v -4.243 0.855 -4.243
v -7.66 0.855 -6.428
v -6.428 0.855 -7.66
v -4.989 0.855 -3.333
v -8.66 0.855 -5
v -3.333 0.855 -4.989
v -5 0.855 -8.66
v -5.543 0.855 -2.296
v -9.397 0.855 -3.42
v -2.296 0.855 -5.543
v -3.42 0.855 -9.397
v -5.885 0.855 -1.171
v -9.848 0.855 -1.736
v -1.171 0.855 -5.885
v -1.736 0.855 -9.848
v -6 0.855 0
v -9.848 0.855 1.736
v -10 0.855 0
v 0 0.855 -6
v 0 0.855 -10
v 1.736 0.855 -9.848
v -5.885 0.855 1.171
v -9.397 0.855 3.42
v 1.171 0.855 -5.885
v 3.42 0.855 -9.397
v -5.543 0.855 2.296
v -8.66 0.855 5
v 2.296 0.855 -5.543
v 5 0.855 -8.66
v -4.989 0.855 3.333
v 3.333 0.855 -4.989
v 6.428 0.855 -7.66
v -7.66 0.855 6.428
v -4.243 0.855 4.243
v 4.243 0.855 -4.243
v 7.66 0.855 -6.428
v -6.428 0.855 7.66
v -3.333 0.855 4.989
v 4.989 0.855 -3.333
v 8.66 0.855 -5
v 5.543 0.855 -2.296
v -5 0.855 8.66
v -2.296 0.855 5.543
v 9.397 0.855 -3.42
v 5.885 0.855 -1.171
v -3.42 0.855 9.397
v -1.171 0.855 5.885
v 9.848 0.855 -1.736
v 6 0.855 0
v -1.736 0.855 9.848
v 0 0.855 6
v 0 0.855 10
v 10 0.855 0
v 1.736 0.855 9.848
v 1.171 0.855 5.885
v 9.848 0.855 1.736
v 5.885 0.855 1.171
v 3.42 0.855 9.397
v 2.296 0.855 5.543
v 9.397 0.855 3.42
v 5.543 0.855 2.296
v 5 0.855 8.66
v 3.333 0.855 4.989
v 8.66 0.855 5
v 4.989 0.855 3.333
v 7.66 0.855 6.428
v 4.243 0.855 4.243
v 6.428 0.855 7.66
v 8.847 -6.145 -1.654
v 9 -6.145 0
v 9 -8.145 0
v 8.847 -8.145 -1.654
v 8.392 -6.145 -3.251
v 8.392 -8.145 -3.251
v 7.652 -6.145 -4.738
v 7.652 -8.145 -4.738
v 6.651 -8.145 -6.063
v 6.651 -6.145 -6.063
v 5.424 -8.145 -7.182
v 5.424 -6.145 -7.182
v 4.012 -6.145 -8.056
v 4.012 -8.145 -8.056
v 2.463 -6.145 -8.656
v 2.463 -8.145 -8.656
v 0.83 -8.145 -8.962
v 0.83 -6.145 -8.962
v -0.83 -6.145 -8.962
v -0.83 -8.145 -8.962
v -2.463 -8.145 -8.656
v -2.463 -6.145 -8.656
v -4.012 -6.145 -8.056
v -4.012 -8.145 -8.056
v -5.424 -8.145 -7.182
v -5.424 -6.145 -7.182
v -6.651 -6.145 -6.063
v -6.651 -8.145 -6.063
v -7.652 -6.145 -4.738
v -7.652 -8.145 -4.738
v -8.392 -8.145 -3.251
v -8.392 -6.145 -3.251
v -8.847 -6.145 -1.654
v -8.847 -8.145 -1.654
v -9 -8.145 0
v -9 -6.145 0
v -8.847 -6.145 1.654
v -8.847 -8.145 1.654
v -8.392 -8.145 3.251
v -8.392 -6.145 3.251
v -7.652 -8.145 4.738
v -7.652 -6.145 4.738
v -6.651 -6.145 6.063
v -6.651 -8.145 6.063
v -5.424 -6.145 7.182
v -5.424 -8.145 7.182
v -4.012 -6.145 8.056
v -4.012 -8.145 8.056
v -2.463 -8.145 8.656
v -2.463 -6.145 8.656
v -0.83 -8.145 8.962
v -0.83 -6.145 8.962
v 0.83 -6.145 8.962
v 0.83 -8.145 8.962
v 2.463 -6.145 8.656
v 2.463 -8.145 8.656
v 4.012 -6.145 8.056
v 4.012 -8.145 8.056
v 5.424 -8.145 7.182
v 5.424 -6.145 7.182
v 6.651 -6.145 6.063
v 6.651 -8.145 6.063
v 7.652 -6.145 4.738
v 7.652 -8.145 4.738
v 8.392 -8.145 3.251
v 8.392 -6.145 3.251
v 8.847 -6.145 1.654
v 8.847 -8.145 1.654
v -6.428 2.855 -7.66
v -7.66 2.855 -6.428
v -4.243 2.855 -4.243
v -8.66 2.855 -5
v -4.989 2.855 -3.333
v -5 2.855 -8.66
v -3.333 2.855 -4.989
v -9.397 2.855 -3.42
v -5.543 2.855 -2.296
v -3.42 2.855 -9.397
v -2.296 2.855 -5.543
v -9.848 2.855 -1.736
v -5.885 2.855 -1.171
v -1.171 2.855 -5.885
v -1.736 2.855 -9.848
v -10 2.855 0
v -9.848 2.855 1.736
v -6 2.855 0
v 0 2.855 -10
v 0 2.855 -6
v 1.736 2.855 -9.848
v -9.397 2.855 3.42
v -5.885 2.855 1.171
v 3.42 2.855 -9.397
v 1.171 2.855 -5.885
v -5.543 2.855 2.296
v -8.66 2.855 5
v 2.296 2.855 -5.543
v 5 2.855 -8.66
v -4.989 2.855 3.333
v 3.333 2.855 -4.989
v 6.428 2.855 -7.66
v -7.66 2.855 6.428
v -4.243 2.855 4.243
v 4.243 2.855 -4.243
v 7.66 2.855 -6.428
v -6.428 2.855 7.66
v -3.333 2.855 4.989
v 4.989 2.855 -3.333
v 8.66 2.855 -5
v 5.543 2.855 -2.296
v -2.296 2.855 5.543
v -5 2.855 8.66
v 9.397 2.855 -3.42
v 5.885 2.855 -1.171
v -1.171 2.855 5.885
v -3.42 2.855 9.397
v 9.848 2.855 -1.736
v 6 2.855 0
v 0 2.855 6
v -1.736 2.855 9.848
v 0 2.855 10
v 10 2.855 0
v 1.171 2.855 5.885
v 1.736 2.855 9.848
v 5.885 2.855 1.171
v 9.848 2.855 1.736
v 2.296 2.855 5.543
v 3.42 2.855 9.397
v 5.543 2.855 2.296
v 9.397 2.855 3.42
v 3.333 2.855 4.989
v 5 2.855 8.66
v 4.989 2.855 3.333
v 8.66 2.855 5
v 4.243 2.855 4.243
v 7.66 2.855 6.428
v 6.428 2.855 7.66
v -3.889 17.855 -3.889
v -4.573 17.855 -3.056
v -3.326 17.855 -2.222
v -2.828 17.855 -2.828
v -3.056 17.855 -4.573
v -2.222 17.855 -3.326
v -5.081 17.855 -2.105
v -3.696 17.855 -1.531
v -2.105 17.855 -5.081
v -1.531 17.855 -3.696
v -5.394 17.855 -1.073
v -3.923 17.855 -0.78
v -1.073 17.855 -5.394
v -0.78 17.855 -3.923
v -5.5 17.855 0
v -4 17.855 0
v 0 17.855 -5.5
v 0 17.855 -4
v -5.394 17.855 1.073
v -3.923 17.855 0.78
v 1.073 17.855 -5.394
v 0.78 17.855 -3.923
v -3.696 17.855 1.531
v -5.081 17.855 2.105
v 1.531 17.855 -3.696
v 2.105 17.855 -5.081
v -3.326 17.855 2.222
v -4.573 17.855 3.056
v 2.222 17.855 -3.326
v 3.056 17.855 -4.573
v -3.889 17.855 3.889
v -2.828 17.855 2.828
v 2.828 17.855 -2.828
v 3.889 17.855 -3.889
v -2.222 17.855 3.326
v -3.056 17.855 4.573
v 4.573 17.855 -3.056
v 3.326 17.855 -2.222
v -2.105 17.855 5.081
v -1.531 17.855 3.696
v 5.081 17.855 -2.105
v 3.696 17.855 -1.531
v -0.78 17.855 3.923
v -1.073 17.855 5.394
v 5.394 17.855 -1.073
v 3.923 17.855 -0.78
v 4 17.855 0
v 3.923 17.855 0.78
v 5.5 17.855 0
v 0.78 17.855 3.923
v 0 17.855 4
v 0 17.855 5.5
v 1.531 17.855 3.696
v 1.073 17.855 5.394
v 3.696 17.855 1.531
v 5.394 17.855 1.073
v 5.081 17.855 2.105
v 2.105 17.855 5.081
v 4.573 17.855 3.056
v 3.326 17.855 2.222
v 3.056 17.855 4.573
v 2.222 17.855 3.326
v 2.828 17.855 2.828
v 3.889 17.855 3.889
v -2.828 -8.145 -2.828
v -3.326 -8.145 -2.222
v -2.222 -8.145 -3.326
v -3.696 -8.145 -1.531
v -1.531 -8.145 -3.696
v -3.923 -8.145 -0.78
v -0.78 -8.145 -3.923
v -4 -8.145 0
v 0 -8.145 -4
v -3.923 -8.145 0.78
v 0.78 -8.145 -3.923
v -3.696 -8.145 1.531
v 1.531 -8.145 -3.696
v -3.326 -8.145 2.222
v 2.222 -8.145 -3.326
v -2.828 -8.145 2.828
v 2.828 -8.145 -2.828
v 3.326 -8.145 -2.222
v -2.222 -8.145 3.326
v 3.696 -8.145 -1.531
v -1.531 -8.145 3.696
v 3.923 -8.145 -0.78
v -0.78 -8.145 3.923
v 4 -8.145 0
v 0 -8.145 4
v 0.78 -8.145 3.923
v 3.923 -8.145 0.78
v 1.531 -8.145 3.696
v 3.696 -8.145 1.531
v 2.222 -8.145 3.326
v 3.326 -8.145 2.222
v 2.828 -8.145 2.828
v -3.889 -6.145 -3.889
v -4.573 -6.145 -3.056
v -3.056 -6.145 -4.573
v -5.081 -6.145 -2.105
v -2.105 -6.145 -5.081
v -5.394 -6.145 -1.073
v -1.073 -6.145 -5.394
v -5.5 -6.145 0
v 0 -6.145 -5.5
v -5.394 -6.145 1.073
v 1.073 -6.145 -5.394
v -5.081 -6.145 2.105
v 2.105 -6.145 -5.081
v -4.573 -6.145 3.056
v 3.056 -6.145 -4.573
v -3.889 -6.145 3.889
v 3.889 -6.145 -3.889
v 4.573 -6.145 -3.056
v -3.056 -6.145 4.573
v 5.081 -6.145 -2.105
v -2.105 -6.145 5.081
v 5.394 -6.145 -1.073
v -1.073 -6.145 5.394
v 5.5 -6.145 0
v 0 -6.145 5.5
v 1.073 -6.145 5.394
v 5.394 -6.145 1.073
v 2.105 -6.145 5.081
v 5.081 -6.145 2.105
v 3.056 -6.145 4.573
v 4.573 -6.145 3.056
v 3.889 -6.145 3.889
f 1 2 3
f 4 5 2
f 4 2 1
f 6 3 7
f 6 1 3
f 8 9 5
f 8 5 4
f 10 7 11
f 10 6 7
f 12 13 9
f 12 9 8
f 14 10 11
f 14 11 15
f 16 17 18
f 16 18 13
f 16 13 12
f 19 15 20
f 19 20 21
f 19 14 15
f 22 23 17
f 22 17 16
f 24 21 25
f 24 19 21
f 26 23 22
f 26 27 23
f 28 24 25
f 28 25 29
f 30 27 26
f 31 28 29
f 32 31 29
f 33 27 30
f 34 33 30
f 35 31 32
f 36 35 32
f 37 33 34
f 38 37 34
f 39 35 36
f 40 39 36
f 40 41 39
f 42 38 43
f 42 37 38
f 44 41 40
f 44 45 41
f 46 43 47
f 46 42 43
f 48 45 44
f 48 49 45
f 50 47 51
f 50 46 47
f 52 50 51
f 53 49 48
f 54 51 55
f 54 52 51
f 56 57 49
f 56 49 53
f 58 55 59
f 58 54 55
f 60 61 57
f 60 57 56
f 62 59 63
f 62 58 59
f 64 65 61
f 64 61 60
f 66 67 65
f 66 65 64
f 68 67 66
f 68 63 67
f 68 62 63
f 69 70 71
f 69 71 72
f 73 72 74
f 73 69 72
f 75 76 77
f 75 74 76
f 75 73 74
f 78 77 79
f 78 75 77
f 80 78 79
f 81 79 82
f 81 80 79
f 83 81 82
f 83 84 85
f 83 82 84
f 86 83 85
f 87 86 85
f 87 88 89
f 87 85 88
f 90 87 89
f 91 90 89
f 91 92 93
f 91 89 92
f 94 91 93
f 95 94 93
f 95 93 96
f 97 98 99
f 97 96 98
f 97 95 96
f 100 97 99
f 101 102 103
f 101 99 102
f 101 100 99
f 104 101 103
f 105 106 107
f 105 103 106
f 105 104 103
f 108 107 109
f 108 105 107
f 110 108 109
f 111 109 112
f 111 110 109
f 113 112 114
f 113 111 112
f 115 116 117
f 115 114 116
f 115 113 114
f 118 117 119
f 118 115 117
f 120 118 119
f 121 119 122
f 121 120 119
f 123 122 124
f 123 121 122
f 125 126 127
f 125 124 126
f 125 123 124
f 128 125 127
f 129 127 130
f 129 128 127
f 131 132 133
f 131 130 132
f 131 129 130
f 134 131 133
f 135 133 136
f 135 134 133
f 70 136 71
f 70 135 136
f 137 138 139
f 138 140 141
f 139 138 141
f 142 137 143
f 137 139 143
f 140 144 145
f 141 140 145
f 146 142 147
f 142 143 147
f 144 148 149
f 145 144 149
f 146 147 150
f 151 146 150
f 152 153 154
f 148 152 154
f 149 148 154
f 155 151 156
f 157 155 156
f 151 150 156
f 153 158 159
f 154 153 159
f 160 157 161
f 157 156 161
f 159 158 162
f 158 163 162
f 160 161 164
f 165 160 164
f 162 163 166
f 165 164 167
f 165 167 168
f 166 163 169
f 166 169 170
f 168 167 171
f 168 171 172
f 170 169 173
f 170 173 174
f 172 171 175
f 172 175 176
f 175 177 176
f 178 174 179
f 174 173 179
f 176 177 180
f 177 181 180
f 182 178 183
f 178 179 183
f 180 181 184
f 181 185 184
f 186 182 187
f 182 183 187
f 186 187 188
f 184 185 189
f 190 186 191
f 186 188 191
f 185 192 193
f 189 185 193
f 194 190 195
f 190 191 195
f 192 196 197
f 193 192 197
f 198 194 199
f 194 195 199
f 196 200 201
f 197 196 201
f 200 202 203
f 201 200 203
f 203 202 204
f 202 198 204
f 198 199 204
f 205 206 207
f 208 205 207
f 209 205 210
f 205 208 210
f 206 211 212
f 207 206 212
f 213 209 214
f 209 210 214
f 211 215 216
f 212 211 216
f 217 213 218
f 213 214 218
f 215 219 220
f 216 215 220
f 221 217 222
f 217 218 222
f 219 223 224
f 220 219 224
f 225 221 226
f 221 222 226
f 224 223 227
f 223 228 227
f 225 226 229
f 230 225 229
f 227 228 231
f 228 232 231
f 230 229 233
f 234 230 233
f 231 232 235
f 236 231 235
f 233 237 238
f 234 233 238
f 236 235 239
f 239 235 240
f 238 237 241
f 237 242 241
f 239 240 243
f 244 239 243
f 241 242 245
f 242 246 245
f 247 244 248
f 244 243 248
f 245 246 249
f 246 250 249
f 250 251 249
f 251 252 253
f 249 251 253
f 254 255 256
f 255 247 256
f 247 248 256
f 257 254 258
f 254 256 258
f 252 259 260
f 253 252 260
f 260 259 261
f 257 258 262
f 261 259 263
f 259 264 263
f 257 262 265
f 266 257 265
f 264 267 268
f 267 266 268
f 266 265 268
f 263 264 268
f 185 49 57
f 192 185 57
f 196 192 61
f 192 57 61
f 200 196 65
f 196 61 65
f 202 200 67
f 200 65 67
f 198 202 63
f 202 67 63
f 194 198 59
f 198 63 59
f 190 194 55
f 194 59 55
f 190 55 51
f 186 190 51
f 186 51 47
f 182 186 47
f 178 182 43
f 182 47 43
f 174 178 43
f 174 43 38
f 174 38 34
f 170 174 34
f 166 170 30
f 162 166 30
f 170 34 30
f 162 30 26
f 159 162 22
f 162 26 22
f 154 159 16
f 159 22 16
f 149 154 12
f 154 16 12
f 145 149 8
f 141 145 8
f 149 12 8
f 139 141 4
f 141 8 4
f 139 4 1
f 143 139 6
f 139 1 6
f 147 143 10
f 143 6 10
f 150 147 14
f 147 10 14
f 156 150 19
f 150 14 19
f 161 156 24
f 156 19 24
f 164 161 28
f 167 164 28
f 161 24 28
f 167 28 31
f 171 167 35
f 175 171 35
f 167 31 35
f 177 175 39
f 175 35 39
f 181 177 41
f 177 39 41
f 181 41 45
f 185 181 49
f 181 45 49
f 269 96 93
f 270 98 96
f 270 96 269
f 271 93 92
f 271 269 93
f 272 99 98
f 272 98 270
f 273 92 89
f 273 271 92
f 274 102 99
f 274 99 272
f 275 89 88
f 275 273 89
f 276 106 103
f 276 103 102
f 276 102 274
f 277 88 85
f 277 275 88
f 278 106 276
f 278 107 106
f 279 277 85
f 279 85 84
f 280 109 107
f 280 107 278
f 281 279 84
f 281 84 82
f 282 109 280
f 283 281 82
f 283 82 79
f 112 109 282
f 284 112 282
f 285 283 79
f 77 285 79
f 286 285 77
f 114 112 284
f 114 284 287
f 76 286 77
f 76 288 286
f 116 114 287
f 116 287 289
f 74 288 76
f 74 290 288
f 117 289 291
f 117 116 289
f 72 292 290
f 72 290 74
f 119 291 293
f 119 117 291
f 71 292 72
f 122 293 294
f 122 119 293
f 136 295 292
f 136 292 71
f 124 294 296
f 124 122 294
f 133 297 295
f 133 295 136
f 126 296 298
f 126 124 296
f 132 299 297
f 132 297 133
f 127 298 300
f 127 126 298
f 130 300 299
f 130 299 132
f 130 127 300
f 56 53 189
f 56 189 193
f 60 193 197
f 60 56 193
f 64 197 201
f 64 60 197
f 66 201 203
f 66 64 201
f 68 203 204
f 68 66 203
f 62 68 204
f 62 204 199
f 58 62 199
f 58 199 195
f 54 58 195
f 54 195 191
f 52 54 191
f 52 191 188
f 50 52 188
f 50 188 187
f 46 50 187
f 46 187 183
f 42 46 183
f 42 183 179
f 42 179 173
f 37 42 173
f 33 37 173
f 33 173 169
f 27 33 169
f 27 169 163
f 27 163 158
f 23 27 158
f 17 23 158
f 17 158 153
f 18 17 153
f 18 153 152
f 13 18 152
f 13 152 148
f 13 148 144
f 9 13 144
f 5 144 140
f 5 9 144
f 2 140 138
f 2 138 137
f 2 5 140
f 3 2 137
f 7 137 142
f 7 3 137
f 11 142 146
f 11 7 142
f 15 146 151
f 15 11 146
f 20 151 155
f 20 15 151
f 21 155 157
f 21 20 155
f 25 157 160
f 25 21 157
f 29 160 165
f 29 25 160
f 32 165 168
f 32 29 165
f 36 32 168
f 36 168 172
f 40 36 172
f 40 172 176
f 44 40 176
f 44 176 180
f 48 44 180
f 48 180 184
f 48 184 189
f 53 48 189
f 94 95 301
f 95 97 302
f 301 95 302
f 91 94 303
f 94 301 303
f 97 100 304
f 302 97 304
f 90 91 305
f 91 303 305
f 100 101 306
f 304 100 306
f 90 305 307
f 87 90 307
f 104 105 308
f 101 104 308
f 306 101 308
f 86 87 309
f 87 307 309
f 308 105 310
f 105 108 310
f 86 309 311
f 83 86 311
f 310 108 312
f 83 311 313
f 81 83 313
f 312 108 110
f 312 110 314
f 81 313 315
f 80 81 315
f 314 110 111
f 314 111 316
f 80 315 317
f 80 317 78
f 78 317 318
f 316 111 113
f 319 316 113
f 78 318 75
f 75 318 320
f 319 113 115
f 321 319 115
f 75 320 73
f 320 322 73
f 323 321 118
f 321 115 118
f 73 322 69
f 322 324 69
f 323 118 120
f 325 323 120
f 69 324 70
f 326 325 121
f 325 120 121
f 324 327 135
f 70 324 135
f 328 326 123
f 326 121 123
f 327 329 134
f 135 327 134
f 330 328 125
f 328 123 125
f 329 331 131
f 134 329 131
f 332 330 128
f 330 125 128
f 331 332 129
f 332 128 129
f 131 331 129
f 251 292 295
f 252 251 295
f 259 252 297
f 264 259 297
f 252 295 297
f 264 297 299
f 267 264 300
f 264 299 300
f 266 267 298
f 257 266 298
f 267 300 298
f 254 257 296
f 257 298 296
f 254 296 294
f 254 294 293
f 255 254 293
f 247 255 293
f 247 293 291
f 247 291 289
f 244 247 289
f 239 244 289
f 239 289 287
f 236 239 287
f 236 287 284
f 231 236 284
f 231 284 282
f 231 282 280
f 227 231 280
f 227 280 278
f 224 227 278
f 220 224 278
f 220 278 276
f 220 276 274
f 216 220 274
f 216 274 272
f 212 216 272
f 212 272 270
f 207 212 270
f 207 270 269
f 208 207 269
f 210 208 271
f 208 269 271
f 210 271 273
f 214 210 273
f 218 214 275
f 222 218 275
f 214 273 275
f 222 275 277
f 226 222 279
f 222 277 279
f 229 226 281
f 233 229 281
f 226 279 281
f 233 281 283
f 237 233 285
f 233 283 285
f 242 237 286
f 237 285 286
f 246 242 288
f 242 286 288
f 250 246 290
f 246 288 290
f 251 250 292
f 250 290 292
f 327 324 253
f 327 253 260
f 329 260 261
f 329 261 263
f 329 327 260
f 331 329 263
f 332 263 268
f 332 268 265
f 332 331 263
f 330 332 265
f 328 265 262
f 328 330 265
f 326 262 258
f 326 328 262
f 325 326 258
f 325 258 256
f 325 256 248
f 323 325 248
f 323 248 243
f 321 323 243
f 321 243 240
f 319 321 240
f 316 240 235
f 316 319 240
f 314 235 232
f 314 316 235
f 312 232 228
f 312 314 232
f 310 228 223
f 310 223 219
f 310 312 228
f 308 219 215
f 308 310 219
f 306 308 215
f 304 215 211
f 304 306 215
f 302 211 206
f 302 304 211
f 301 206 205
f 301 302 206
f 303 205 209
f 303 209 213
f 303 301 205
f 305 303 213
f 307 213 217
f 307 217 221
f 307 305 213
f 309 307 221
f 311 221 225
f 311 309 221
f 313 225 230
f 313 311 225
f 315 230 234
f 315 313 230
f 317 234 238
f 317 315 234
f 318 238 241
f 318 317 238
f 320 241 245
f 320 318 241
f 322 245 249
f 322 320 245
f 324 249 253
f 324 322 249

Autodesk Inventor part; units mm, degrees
ref_plane "YZ Plane" through (0, 0, 0) normal (1, 0, 0) x (0, 1, 0)
ref_plane "XZ Plane" through (0, 0, 0) normal (0, 1, 0) x (-1, 0, 0)
ref_plane "XY Plane" through (0, 0, 0) normal (0, 0, 1) x (1, 0, 0)
sketch "Skizze1" plane through (0, 0, 0) normal (0, 0, 1) x (1, 0, 0)
  line L0 (0, 23.0554) -> (0, -13.3446) construction
  line L1 (-2, 0) -> (12, 0) construction
  line L2 (4, 17.8554) -> (5.5, 17.8554)
  line L3 (5.5, 17.8554) -> (5.5, -6.1446)
  line L4 (4, 17.8554) -> (4, -8.1446)
  line L5 (4, -8.1446) -> (9, -8.1446)
  line L6 (9, -8.1446) -> (9, -6.1446)
  line L7 (9, -6.1446) -> (5.5, -6.1446)
  line L8 (6, 2.8554) -> (6, 0.8554)
  line L9 (6, 2.8554) -> (10, 2.8554)
  line L10 (10, 2.8554) -> (10, 0.8554)
  line L11 (10, 0.8554) -> (6, 0.8554)
  point P0 (0, 0)
  dimension "d9" = 4
  dimension "d10" = 5.5
  dimension "d11" = 5
  dimension "d12" = 2
  dimension "d13" = 24
  dimension "d14" = 0.5
  dimension "d15" = 2
  dimension "d16" = 10
  dimension "d21" = 7
revolve "Umdrehung1" add sketch "Skizze1" angle 360 about axis through (0, 0, 0) along (0, -1, 0) contours L2 L3 L7 L6 L5 L4
revolve "Umdrehung2" add sketch "Skizze1" angle 360 about axis through (0, 0, 0) along (0, -1, 0) separate body contours L9 L10 L11 L8
properties part number "Zugentlastung"
